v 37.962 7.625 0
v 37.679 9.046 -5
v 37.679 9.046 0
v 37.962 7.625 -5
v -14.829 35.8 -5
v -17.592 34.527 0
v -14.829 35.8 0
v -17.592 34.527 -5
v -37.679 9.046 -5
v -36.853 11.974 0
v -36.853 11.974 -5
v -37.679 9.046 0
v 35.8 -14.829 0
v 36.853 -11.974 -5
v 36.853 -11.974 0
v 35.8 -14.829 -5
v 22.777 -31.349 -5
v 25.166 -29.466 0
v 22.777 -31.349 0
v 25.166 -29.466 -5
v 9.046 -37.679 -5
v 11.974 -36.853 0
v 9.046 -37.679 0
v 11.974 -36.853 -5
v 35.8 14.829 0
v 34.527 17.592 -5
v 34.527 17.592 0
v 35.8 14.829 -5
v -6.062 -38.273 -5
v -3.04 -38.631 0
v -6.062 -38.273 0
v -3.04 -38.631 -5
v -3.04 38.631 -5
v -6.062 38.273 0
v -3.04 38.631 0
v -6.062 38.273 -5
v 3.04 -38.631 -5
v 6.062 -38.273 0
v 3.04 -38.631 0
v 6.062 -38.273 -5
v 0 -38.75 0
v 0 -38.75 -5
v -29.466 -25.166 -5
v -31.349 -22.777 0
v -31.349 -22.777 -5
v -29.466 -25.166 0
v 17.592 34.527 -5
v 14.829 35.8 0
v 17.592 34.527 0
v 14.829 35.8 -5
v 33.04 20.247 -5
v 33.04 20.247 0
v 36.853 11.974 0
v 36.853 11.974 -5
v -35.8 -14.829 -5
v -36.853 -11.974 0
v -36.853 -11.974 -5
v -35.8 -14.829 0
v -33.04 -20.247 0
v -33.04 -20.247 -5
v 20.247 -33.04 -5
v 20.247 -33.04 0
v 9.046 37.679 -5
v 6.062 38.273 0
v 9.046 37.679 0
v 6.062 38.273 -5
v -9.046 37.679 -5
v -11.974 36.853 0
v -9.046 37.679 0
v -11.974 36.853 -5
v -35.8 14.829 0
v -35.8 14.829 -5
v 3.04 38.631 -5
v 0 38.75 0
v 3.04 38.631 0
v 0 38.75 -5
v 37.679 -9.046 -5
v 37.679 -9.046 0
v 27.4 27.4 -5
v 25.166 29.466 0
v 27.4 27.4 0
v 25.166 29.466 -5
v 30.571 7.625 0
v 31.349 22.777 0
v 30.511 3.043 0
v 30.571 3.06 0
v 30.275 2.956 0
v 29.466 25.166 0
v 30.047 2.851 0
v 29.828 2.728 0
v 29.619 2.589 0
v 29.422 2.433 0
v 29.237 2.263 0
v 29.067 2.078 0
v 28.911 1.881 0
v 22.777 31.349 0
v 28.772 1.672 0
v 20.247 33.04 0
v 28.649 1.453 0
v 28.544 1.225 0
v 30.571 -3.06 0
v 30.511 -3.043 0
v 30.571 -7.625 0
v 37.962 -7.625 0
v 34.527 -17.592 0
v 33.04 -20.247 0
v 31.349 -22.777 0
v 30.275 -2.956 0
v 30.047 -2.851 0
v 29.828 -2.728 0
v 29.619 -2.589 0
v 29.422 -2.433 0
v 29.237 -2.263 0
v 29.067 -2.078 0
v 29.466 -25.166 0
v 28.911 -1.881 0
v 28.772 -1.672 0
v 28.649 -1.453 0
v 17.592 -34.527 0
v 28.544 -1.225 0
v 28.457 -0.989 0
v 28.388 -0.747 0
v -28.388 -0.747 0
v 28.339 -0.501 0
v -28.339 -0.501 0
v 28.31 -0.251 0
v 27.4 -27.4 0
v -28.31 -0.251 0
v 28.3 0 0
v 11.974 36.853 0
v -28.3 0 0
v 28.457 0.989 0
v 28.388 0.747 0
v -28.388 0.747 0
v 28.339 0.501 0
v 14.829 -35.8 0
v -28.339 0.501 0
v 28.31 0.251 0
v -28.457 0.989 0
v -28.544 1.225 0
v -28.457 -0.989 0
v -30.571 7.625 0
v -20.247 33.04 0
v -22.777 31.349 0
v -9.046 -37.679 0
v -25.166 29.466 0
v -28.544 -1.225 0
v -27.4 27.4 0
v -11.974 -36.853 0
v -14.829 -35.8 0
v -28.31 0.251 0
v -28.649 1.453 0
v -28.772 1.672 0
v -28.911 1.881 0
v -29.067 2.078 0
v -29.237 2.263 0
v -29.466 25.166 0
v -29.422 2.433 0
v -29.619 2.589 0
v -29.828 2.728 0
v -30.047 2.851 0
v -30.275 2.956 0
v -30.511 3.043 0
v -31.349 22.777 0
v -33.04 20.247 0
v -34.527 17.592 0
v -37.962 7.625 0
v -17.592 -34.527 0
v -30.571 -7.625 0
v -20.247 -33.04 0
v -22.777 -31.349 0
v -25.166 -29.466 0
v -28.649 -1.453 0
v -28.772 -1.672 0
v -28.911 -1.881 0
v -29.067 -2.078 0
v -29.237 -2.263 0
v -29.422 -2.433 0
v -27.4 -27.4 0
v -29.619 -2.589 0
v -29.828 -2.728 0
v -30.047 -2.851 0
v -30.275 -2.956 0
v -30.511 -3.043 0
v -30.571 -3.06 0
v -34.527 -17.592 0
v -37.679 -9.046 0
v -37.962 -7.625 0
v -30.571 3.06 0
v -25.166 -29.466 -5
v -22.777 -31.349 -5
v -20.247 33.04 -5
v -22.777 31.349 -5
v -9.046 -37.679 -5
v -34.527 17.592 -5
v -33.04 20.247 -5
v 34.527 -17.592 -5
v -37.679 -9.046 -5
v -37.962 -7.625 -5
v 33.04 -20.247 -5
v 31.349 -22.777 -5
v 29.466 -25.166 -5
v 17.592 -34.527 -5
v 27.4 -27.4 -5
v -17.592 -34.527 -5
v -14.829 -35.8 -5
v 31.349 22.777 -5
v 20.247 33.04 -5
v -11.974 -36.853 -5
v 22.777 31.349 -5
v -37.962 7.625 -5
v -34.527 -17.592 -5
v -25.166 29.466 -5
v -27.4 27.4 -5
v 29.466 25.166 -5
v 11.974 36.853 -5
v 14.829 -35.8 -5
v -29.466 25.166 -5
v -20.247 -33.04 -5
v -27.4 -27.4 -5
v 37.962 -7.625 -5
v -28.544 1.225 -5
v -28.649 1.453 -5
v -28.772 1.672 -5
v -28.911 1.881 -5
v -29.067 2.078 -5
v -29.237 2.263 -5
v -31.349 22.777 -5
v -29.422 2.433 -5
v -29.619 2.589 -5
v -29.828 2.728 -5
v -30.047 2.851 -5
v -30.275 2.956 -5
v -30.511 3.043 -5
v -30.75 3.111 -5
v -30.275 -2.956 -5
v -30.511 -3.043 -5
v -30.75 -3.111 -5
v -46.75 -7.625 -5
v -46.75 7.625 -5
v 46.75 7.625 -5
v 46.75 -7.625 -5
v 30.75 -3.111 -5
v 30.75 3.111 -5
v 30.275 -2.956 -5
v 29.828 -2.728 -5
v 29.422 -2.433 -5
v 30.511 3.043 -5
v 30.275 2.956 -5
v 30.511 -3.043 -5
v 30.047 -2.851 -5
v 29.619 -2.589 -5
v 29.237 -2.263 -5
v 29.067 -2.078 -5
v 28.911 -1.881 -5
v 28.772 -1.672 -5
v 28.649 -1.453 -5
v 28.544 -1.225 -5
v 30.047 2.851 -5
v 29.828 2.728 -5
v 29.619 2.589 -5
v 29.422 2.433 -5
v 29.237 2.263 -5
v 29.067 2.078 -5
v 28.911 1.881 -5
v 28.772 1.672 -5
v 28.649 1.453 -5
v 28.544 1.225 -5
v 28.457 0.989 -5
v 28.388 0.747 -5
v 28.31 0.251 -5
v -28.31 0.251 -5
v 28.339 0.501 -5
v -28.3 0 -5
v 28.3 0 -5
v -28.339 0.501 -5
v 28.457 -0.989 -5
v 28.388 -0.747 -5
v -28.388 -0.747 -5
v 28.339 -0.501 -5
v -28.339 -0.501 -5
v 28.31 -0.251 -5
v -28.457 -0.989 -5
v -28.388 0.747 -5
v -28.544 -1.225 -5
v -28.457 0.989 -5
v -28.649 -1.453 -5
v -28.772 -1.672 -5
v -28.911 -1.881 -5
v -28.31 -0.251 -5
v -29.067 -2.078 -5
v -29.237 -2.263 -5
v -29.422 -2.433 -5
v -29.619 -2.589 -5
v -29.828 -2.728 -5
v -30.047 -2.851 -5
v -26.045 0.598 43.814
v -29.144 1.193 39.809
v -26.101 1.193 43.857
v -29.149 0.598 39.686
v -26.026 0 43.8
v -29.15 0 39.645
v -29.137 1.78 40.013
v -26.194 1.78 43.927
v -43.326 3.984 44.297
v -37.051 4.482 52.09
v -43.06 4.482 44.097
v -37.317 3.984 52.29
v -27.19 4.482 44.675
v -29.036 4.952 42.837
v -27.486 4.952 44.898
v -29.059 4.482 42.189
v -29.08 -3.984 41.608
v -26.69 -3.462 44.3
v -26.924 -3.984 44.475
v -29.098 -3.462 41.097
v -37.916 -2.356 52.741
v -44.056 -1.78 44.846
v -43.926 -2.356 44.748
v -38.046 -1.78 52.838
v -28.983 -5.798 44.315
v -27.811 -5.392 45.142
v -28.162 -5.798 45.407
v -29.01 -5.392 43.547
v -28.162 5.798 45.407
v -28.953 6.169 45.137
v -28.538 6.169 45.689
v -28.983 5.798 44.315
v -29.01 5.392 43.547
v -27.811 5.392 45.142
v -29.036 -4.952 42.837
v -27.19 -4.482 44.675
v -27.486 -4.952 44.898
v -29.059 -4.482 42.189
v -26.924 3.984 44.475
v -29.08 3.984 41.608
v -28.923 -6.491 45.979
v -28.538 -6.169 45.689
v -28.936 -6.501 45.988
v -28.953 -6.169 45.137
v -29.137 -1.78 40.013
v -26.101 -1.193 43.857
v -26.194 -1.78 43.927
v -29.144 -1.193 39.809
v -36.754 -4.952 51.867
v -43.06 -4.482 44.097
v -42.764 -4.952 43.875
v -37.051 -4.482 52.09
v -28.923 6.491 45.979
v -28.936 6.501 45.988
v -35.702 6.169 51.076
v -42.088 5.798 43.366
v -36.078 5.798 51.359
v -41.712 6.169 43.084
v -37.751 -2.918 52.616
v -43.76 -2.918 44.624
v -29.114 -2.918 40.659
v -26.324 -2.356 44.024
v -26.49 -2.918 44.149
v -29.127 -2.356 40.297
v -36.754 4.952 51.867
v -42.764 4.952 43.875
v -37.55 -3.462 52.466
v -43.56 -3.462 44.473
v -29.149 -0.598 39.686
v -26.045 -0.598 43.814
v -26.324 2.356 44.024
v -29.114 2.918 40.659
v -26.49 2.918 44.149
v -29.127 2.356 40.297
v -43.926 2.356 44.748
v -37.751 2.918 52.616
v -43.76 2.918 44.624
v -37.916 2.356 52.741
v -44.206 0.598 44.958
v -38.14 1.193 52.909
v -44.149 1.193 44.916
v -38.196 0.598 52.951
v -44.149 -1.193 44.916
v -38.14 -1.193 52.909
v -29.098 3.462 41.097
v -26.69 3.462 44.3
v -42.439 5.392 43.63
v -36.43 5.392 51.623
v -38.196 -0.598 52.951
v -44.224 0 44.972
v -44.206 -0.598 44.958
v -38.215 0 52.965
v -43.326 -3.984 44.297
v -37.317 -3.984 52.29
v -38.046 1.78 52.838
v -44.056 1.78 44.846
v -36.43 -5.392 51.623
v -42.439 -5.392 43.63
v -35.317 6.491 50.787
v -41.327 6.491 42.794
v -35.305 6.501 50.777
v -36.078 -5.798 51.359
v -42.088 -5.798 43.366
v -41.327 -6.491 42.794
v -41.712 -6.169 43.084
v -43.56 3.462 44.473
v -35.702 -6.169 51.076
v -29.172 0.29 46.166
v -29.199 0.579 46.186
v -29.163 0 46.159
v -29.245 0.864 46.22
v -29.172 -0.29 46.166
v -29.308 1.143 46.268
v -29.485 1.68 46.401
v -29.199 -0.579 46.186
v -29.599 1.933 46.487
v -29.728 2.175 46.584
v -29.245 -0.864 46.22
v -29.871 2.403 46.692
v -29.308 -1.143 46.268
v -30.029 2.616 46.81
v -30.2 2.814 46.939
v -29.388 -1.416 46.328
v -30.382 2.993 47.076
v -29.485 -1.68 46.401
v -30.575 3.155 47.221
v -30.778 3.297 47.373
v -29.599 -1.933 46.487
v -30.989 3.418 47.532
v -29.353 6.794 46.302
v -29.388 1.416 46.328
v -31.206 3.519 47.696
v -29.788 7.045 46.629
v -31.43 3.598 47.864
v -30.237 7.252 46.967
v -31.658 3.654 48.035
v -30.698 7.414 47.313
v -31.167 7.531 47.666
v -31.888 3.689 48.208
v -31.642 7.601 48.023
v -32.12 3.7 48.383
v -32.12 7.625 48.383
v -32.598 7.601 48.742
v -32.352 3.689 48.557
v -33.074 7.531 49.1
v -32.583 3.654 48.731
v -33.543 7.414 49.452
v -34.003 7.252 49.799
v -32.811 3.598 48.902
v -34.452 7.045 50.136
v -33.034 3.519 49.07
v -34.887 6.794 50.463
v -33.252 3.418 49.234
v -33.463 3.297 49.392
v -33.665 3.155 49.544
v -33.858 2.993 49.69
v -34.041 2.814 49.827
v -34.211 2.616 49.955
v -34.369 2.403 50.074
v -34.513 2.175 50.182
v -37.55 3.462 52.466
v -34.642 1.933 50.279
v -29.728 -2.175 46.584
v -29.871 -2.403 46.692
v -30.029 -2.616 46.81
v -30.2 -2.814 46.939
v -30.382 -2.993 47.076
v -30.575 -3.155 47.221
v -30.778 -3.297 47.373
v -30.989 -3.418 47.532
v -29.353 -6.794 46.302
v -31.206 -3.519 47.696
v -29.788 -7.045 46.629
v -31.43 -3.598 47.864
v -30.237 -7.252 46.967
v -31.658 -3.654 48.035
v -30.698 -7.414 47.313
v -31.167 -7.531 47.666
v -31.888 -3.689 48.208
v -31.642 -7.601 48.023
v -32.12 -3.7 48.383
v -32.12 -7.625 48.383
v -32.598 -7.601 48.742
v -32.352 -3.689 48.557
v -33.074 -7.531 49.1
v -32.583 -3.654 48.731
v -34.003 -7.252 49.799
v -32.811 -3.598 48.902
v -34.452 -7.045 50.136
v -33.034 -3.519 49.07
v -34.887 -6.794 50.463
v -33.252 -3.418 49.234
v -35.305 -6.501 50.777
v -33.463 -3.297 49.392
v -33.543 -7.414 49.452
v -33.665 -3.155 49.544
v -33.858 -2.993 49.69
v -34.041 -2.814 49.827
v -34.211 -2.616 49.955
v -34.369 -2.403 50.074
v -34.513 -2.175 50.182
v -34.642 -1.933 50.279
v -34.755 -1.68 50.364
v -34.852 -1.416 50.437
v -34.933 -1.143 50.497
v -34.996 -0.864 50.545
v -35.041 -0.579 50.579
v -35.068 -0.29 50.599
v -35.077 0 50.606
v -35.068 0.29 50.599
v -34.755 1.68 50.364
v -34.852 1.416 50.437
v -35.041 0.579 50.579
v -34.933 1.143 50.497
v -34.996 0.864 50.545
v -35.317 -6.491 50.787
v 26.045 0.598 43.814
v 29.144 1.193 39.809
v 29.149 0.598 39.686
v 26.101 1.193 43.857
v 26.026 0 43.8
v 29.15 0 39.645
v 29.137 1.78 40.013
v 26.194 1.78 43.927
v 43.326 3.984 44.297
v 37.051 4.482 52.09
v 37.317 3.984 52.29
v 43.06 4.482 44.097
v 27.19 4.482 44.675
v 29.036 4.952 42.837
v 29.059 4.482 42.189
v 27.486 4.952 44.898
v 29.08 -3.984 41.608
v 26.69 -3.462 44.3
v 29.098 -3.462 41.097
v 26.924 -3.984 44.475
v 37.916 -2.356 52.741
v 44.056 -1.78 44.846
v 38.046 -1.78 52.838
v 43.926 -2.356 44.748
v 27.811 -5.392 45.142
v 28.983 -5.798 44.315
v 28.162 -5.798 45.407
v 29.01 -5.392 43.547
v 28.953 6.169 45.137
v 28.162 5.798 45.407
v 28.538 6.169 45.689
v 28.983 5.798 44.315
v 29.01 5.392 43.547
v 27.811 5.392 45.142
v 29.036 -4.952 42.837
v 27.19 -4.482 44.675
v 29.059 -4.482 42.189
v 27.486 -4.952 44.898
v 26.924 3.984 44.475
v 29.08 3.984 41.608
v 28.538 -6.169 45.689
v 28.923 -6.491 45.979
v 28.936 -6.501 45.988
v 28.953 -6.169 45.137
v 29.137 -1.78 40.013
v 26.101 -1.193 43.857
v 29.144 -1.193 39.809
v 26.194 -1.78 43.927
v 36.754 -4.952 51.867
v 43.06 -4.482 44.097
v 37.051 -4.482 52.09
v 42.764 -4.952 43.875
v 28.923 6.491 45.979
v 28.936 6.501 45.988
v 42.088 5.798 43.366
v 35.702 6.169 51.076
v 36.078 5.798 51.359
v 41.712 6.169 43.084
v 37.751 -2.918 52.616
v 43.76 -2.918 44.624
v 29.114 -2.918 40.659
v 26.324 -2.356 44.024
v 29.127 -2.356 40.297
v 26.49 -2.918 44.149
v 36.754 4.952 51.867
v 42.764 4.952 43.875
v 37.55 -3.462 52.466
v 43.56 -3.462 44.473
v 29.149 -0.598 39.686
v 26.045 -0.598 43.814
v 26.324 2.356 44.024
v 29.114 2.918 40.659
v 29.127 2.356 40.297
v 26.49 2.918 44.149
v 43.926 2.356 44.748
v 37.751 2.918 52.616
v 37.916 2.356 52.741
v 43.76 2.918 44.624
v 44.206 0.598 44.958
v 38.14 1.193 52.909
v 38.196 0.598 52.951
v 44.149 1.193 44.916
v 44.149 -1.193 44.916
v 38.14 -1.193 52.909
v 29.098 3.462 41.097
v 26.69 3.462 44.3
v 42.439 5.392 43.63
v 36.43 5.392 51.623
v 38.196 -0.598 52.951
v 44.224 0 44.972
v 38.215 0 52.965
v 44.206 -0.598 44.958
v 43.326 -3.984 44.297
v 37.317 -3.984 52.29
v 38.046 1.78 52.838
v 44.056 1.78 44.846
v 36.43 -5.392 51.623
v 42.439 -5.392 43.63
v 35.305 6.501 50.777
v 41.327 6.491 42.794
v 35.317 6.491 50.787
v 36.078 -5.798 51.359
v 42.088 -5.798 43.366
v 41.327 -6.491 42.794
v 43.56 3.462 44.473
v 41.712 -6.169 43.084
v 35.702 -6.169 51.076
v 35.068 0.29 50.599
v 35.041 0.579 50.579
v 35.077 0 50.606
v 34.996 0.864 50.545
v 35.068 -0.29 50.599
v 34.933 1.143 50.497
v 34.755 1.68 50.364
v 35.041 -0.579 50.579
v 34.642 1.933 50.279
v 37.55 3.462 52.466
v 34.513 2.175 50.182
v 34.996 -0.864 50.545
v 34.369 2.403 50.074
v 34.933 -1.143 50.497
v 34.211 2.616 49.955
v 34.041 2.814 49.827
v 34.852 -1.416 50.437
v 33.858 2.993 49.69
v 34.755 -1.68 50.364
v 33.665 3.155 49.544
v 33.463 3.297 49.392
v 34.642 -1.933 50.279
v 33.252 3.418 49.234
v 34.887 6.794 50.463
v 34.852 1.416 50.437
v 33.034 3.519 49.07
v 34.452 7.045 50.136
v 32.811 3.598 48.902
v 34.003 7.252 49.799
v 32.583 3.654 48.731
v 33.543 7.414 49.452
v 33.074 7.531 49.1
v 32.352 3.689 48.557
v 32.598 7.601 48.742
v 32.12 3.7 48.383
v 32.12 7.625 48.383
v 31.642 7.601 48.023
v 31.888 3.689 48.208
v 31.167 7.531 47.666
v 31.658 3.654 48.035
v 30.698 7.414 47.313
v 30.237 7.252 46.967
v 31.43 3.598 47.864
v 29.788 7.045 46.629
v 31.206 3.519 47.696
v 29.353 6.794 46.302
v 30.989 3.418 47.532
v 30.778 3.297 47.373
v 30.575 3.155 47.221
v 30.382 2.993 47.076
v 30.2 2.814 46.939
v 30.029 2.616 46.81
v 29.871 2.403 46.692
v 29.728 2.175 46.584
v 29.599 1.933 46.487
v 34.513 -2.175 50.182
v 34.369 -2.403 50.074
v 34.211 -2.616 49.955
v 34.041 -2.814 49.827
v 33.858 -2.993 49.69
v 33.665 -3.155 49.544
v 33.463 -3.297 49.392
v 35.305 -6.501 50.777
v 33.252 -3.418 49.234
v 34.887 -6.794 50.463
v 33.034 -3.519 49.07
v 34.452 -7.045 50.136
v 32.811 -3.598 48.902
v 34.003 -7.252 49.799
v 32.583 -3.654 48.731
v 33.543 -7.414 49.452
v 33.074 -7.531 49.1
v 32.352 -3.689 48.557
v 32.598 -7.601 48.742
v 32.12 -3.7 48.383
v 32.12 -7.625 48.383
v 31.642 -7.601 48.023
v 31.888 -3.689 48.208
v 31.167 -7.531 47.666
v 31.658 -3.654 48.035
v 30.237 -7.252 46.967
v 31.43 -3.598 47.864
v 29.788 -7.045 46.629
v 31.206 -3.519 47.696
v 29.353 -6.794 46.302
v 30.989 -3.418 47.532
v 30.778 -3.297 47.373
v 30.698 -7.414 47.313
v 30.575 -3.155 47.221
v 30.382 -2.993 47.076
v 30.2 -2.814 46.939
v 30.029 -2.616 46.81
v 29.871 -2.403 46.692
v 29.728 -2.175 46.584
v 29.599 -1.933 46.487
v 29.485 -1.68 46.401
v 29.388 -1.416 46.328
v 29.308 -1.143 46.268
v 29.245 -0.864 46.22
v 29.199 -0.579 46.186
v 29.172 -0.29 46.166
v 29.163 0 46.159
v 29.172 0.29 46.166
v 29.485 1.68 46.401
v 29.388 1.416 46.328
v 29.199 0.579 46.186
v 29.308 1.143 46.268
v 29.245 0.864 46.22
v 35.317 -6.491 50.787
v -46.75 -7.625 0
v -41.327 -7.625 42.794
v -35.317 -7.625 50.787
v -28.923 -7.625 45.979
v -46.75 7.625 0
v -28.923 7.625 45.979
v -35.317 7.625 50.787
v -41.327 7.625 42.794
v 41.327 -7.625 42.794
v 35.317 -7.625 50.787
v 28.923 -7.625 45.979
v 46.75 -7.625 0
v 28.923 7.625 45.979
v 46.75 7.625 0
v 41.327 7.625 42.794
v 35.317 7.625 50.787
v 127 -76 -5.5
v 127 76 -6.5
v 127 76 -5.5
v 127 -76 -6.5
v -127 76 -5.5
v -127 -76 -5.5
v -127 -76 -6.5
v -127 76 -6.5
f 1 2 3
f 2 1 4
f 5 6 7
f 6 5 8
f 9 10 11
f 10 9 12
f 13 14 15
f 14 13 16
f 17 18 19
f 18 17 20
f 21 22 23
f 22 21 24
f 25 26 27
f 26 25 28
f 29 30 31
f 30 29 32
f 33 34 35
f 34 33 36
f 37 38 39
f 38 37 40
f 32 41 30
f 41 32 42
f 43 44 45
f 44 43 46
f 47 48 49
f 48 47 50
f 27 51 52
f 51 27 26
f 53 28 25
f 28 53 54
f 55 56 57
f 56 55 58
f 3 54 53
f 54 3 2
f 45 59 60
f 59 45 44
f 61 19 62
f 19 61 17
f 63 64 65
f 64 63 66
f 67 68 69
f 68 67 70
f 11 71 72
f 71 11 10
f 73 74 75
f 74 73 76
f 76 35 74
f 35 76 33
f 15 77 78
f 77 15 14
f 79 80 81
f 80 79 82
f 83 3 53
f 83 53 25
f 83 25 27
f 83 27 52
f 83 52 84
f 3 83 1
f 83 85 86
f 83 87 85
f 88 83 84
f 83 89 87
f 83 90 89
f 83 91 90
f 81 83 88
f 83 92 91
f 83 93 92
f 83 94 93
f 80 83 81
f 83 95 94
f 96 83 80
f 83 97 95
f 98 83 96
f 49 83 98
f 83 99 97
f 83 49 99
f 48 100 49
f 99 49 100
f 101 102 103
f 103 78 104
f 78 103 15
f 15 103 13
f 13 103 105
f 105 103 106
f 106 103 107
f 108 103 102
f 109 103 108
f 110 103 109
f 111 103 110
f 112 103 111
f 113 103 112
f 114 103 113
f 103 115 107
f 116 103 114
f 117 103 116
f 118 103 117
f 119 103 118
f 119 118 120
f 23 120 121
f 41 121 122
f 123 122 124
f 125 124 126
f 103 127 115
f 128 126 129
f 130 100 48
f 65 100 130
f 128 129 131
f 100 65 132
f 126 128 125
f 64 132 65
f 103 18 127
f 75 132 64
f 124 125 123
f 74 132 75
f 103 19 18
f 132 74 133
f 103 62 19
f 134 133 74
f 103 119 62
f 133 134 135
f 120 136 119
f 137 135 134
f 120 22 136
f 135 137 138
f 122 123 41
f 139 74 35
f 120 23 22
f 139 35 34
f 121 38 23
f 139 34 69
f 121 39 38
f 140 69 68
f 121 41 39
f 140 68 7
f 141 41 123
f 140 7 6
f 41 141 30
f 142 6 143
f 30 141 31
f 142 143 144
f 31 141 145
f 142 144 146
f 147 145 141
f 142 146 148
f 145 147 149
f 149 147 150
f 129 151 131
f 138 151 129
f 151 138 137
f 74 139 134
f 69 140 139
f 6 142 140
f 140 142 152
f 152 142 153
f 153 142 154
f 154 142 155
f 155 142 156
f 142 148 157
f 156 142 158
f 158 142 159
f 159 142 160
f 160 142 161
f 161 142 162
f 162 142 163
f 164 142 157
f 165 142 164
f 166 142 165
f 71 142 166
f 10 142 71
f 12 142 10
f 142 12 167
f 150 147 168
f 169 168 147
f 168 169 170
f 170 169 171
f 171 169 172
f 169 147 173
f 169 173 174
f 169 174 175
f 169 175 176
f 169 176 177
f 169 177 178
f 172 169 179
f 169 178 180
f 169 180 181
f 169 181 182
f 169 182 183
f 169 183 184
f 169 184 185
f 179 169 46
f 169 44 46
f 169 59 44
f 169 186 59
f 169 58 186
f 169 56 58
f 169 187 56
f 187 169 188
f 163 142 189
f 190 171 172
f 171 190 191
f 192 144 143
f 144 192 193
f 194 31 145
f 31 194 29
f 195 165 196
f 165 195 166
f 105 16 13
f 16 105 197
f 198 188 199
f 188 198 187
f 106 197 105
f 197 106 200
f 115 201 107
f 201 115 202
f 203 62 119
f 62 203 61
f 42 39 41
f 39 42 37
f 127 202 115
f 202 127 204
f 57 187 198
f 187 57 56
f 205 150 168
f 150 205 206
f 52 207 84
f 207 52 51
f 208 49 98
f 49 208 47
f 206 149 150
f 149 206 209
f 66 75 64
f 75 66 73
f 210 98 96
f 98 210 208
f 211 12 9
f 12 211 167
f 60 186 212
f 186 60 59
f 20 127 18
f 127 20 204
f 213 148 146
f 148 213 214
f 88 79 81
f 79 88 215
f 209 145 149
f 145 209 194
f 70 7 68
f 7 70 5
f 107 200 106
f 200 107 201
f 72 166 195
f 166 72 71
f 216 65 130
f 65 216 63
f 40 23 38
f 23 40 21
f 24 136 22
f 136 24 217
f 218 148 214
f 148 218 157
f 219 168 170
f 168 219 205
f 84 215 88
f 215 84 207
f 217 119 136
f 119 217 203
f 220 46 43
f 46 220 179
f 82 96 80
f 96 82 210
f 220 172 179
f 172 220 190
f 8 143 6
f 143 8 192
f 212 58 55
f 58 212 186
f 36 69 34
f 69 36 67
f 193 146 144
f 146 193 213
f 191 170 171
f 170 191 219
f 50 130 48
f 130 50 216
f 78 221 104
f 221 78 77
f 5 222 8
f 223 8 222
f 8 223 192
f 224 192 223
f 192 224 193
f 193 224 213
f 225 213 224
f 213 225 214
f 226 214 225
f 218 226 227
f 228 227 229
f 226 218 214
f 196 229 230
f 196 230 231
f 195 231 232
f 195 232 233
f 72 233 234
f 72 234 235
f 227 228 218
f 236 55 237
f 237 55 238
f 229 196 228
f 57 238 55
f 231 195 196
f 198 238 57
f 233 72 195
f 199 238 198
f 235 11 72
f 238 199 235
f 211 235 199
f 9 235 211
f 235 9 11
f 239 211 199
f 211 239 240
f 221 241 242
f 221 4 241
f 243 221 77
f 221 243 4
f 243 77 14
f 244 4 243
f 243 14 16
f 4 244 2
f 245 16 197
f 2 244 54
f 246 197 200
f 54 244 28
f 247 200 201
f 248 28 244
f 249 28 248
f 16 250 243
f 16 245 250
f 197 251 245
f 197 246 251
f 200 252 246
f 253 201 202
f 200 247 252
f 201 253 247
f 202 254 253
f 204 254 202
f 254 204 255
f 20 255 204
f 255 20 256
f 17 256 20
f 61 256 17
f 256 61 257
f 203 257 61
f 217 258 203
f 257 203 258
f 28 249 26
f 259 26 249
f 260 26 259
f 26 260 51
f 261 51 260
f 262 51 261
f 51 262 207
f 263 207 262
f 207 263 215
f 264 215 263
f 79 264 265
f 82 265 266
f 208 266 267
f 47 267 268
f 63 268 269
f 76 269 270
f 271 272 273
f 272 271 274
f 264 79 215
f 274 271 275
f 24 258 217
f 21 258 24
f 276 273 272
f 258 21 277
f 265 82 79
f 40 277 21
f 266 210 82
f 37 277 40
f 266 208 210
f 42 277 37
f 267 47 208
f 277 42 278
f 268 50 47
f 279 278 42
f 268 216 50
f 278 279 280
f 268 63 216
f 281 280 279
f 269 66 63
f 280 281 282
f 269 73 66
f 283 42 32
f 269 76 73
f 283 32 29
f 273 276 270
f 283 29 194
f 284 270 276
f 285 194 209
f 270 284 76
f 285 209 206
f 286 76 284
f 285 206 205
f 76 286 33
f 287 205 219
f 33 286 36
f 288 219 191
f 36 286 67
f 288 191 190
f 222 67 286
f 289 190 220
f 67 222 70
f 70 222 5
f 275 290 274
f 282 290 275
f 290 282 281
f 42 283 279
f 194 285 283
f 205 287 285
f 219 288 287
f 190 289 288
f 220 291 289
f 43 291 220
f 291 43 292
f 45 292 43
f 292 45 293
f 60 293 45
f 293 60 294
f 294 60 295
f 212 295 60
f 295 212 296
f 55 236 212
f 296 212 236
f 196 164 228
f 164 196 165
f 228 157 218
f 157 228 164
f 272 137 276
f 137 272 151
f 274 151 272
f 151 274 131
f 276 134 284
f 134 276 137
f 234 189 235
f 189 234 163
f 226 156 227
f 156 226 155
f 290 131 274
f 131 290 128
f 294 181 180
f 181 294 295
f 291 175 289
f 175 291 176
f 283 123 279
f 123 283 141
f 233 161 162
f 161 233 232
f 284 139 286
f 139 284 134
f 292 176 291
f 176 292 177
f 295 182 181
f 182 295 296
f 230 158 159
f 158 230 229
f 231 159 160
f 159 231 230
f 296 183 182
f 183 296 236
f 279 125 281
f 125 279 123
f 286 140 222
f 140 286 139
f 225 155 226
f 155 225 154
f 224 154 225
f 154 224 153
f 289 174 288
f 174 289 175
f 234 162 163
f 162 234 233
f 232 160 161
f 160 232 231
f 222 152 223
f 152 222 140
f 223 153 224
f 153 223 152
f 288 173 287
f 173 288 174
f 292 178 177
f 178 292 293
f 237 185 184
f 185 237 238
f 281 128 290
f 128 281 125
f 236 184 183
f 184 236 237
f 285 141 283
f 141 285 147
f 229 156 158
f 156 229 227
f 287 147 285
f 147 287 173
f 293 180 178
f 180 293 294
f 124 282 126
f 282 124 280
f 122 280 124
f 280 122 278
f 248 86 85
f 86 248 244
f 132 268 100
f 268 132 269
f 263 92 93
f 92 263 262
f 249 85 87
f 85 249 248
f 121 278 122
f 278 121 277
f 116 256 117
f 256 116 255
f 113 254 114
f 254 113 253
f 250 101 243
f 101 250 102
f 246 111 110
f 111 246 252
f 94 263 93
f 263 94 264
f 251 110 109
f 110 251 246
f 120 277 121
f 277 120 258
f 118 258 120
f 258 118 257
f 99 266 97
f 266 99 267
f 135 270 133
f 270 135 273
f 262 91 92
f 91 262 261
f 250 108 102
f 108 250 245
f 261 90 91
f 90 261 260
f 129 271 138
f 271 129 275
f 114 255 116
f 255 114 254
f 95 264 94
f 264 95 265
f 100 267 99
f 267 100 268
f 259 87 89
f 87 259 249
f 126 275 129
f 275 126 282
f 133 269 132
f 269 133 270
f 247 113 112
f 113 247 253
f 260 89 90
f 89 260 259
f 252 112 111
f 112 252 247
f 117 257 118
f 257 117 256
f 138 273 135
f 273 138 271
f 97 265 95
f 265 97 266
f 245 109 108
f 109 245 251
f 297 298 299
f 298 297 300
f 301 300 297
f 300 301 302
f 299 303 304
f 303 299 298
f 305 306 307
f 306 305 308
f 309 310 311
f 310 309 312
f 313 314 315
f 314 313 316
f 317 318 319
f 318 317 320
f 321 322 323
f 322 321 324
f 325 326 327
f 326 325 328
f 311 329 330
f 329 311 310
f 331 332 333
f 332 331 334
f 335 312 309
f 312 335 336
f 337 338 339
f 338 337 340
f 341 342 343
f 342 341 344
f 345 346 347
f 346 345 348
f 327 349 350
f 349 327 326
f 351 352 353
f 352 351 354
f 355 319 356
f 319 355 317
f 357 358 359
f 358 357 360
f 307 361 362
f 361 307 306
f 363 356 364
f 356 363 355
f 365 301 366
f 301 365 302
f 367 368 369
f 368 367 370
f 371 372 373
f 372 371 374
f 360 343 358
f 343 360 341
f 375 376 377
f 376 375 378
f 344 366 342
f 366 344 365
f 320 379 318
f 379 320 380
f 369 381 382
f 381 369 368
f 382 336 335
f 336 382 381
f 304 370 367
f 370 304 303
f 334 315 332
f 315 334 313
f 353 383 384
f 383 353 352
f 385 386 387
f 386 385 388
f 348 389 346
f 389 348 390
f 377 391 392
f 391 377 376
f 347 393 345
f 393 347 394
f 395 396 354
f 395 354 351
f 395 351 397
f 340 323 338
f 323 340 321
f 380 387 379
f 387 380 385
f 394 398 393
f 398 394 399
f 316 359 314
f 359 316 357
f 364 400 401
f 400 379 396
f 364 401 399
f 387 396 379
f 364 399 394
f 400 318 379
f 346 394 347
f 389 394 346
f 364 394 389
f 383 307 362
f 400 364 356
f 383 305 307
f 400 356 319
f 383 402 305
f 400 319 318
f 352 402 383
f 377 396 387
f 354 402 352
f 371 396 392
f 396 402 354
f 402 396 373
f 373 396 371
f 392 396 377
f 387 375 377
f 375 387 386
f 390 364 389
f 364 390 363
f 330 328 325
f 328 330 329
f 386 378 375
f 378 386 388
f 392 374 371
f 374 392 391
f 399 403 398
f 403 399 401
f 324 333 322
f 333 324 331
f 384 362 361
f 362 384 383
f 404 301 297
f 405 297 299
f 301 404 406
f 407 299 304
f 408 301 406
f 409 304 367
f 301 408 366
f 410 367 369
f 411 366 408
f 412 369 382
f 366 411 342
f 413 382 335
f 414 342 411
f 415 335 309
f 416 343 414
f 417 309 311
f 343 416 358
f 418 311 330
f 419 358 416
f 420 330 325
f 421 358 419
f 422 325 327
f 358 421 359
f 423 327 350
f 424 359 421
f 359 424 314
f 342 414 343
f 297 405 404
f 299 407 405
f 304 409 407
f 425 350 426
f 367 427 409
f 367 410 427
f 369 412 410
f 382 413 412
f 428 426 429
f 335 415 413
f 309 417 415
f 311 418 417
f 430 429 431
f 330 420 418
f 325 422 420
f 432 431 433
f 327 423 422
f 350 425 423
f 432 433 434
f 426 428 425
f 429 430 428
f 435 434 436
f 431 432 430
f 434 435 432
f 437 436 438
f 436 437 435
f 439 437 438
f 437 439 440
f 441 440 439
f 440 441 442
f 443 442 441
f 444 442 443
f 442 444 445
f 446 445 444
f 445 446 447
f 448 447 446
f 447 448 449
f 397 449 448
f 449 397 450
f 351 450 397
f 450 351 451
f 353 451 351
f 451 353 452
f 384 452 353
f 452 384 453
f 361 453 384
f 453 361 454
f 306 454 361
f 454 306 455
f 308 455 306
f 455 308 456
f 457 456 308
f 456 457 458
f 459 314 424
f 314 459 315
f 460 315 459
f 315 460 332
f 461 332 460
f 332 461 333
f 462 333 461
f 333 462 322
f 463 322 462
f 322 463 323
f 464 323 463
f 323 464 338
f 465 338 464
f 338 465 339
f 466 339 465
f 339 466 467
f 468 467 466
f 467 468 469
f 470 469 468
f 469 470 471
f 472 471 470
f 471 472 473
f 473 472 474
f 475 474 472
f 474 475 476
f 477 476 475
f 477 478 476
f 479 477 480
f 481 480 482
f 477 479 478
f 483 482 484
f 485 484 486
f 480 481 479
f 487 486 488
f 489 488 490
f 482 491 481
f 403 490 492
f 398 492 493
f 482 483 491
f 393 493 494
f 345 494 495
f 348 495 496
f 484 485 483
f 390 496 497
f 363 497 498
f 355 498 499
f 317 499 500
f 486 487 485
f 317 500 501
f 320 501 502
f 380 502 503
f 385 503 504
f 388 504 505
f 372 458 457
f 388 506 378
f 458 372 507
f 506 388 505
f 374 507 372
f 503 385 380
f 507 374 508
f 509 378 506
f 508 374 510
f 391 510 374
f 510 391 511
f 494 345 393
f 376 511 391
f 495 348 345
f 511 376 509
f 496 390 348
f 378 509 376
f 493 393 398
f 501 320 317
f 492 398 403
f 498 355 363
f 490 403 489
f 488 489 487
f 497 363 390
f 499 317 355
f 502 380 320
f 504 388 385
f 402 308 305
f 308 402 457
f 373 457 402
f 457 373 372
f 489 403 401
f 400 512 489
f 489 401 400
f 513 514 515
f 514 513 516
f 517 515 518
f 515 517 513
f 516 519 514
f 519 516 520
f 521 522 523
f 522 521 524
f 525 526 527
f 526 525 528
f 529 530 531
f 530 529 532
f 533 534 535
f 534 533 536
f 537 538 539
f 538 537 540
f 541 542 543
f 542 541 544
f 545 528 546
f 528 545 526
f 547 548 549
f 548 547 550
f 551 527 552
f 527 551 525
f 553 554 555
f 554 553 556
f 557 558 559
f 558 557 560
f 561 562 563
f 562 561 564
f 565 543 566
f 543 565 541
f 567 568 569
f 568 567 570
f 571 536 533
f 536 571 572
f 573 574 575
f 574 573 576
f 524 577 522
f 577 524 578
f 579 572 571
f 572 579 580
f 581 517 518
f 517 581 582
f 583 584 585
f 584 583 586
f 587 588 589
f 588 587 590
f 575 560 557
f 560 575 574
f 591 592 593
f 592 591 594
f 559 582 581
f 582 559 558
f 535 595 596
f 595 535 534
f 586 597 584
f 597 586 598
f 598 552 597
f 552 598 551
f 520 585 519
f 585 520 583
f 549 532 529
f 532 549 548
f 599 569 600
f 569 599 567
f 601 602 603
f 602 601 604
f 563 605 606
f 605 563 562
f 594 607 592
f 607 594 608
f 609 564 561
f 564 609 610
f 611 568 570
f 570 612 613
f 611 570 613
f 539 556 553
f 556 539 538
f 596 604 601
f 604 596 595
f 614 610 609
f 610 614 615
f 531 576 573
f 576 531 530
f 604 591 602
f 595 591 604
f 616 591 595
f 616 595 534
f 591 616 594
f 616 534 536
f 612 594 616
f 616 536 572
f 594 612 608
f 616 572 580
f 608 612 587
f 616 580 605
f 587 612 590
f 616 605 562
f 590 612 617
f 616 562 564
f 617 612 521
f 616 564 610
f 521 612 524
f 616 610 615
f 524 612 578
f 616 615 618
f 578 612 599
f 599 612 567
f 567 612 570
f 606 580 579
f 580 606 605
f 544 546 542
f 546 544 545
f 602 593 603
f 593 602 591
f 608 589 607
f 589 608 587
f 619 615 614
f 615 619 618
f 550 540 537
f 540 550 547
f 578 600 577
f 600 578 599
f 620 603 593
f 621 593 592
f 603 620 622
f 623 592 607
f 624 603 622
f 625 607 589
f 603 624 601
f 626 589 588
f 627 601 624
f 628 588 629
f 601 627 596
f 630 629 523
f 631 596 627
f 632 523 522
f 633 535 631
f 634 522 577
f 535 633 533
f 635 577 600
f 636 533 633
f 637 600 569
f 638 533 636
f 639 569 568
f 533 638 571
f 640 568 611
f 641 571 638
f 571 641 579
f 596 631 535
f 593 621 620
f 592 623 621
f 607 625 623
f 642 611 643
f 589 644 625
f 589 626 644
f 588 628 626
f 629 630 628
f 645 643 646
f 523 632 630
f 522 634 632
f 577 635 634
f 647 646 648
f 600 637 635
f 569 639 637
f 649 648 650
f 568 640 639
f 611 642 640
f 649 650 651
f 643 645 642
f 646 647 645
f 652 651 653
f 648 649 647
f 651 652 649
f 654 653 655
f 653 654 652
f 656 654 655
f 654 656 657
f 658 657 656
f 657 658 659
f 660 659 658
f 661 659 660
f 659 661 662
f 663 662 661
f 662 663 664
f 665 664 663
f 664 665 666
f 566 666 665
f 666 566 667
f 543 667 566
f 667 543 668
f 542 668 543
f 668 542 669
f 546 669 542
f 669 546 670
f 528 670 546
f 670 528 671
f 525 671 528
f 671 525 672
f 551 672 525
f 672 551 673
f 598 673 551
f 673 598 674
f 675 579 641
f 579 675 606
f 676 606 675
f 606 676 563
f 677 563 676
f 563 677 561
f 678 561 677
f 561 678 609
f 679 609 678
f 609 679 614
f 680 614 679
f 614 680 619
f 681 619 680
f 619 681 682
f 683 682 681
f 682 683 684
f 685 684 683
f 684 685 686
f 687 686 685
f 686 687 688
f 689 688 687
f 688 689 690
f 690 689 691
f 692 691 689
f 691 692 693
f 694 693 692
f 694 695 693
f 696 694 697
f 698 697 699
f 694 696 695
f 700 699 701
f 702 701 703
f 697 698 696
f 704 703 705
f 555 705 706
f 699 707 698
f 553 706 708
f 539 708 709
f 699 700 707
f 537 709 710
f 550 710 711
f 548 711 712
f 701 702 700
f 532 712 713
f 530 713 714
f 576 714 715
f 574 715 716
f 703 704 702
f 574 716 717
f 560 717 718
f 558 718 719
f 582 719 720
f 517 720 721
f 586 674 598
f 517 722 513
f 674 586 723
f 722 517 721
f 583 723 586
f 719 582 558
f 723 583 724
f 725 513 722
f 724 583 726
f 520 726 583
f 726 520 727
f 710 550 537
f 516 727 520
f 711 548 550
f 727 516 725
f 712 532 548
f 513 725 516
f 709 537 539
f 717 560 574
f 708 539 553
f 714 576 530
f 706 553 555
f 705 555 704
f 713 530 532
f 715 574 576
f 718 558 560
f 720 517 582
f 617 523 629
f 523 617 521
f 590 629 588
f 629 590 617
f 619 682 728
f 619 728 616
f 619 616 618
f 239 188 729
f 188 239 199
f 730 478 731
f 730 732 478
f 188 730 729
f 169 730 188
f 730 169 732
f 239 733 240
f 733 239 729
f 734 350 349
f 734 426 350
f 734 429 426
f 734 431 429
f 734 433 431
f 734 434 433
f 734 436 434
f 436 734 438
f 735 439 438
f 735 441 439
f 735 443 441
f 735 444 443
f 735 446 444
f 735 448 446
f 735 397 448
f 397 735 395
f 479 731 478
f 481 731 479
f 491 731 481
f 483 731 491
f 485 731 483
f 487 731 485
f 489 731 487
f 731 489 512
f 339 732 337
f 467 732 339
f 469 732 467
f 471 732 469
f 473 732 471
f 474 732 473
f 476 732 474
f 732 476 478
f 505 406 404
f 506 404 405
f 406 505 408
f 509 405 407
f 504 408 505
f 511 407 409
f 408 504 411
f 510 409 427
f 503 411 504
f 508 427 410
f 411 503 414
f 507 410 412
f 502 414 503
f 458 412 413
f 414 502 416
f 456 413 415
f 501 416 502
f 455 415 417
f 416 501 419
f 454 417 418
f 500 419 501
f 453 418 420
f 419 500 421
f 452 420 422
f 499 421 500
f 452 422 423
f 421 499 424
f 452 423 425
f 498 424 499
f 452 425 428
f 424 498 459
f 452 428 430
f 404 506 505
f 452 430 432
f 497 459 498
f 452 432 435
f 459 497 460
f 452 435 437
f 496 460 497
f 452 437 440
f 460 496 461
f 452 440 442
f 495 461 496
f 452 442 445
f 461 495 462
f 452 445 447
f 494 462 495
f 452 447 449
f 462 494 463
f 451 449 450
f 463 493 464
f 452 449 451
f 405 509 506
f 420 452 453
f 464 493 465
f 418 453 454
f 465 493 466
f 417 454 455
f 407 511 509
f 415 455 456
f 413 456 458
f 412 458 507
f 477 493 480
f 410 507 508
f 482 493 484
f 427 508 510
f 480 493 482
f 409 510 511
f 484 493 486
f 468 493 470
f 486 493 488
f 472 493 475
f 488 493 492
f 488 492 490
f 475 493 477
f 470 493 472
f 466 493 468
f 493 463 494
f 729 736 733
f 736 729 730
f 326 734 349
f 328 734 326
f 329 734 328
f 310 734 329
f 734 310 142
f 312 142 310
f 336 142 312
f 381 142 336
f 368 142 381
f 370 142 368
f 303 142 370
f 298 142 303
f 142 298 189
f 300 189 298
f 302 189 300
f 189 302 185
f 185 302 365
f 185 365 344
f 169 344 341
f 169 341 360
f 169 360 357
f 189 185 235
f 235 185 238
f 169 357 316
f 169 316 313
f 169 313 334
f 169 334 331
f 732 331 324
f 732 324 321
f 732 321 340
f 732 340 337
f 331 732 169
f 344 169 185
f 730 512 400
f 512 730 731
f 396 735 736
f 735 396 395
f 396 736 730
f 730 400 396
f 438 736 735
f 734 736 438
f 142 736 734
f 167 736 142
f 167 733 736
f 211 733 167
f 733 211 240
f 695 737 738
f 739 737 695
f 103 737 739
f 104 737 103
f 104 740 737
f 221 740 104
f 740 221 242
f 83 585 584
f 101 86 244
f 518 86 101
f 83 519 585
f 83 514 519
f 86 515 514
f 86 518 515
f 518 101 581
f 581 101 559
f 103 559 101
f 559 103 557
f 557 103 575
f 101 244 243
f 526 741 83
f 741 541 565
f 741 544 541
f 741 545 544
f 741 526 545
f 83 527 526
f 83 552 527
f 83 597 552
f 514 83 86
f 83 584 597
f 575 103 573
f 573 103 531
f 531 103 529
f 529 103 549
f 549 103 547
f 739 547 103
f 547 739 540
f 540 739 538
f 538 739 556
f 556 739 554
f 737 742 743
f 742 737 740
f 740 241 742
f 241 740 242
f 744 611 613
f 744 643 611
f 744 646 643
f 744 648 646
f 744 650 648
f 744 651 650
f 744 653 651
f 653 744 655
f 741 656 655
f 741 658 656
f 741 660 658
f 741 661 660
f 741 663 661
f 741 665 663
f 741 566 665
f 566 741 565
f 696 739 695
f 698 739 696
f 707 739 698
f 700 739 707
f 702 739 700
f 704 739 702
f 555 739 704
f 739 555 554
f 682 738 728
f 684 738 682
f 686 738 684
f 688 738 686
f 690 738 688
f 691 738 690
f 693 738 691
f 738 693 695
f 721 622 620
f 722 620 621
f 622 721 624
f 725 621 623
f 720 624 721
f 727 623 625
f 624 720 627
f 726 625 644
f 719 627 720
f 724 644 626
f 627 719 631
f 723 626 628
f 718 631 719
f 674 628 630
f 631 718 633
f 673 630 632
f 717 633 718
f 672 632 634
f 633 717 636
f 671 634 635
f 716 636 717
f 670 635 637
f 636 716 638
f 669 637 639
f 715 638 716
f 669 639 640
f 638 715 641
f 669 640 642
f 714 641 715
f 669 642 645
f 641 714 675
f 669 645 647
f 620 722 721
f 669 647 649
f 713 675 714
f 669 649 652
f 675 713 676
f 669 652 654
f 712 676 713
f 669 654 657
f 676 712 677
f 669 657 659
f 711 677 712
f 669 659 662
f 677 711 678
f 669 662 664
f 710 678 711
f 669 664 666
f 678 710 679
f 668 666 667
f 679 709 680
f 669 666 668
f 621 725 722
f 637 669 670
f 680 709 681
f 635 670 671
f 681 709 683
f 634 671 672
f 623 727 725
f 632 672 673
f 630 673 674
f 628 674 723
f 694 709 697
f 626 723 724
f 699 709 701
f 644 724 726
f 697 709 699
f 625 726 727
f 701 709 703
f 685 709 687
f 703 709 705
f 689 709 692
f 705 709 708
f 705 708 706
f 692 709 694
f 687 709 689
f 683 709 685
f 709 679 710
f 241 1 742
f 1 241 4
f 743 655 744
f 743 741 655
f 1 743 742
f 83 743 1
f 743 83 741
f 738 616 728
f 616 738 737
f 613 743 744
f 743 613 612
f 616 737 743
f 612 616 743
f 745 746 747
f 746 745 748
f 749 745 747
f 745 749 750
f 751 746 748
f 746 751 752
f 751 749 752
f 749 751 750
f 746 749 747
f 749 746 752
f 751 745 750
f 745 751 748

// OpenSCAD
// Preview: WristCameraHolder sitting on Dremel 3D45 glass bed
$fn = 80;

// Dremel 3D45 build plate 254 x 152 mm
color([0.3, 0.5, 0.8, 0.5])
    translate([0, 0, -6])
        cube([254, 152, 1], center = true);

// Part, plate-down on bed (shift up so disc bottom rests at z=-5 -> on bed top z=-5)
color([0.85, 0.85, 0.9])
import_part();

module import_part() {
    // Inline copy of export_combined.scad geometry
    module mounting_plate() {
        translate([0, 0, -5])
        difference() {
            cylinder(h = 5, r = 38.75);
            translate([-31.5, 0, -1]) cylinder(h = 7, r = 3.2);
            translate([ 31.5, 0, -1]) cylinder(h = 7, r = 3.2);
        }
    }
    module arm_raw(mir=false) {
        cam_x = -38.13; tilt_angle = 36.94;
        hull() {
            translate([cam_x, 0, 40.39]) rotate([0, tilt_angle, 0])
                translate([0, 0, 5]) cube([8, 15.25, 10], center = true);
            translate([-38.75 + 4 - 4, 0, -2.5])
                cube([16, 15.25, 5], center = true);
        }
    }
    module holder() {
        translate([-38.13, 0, 40.39]) rotate([0, 36.94, 0])
            difference() {
                cylinder(h = 10, d = 15.25);
                translate([0, 0, -1]) cylinder(h = 12, d = 7.4);
            }
    }
    mounting_plate();
    arm_raw();
    mirror([1,0,0]) arm_raw();
    holder();
    mirror([1,0,0]) holder();
}
